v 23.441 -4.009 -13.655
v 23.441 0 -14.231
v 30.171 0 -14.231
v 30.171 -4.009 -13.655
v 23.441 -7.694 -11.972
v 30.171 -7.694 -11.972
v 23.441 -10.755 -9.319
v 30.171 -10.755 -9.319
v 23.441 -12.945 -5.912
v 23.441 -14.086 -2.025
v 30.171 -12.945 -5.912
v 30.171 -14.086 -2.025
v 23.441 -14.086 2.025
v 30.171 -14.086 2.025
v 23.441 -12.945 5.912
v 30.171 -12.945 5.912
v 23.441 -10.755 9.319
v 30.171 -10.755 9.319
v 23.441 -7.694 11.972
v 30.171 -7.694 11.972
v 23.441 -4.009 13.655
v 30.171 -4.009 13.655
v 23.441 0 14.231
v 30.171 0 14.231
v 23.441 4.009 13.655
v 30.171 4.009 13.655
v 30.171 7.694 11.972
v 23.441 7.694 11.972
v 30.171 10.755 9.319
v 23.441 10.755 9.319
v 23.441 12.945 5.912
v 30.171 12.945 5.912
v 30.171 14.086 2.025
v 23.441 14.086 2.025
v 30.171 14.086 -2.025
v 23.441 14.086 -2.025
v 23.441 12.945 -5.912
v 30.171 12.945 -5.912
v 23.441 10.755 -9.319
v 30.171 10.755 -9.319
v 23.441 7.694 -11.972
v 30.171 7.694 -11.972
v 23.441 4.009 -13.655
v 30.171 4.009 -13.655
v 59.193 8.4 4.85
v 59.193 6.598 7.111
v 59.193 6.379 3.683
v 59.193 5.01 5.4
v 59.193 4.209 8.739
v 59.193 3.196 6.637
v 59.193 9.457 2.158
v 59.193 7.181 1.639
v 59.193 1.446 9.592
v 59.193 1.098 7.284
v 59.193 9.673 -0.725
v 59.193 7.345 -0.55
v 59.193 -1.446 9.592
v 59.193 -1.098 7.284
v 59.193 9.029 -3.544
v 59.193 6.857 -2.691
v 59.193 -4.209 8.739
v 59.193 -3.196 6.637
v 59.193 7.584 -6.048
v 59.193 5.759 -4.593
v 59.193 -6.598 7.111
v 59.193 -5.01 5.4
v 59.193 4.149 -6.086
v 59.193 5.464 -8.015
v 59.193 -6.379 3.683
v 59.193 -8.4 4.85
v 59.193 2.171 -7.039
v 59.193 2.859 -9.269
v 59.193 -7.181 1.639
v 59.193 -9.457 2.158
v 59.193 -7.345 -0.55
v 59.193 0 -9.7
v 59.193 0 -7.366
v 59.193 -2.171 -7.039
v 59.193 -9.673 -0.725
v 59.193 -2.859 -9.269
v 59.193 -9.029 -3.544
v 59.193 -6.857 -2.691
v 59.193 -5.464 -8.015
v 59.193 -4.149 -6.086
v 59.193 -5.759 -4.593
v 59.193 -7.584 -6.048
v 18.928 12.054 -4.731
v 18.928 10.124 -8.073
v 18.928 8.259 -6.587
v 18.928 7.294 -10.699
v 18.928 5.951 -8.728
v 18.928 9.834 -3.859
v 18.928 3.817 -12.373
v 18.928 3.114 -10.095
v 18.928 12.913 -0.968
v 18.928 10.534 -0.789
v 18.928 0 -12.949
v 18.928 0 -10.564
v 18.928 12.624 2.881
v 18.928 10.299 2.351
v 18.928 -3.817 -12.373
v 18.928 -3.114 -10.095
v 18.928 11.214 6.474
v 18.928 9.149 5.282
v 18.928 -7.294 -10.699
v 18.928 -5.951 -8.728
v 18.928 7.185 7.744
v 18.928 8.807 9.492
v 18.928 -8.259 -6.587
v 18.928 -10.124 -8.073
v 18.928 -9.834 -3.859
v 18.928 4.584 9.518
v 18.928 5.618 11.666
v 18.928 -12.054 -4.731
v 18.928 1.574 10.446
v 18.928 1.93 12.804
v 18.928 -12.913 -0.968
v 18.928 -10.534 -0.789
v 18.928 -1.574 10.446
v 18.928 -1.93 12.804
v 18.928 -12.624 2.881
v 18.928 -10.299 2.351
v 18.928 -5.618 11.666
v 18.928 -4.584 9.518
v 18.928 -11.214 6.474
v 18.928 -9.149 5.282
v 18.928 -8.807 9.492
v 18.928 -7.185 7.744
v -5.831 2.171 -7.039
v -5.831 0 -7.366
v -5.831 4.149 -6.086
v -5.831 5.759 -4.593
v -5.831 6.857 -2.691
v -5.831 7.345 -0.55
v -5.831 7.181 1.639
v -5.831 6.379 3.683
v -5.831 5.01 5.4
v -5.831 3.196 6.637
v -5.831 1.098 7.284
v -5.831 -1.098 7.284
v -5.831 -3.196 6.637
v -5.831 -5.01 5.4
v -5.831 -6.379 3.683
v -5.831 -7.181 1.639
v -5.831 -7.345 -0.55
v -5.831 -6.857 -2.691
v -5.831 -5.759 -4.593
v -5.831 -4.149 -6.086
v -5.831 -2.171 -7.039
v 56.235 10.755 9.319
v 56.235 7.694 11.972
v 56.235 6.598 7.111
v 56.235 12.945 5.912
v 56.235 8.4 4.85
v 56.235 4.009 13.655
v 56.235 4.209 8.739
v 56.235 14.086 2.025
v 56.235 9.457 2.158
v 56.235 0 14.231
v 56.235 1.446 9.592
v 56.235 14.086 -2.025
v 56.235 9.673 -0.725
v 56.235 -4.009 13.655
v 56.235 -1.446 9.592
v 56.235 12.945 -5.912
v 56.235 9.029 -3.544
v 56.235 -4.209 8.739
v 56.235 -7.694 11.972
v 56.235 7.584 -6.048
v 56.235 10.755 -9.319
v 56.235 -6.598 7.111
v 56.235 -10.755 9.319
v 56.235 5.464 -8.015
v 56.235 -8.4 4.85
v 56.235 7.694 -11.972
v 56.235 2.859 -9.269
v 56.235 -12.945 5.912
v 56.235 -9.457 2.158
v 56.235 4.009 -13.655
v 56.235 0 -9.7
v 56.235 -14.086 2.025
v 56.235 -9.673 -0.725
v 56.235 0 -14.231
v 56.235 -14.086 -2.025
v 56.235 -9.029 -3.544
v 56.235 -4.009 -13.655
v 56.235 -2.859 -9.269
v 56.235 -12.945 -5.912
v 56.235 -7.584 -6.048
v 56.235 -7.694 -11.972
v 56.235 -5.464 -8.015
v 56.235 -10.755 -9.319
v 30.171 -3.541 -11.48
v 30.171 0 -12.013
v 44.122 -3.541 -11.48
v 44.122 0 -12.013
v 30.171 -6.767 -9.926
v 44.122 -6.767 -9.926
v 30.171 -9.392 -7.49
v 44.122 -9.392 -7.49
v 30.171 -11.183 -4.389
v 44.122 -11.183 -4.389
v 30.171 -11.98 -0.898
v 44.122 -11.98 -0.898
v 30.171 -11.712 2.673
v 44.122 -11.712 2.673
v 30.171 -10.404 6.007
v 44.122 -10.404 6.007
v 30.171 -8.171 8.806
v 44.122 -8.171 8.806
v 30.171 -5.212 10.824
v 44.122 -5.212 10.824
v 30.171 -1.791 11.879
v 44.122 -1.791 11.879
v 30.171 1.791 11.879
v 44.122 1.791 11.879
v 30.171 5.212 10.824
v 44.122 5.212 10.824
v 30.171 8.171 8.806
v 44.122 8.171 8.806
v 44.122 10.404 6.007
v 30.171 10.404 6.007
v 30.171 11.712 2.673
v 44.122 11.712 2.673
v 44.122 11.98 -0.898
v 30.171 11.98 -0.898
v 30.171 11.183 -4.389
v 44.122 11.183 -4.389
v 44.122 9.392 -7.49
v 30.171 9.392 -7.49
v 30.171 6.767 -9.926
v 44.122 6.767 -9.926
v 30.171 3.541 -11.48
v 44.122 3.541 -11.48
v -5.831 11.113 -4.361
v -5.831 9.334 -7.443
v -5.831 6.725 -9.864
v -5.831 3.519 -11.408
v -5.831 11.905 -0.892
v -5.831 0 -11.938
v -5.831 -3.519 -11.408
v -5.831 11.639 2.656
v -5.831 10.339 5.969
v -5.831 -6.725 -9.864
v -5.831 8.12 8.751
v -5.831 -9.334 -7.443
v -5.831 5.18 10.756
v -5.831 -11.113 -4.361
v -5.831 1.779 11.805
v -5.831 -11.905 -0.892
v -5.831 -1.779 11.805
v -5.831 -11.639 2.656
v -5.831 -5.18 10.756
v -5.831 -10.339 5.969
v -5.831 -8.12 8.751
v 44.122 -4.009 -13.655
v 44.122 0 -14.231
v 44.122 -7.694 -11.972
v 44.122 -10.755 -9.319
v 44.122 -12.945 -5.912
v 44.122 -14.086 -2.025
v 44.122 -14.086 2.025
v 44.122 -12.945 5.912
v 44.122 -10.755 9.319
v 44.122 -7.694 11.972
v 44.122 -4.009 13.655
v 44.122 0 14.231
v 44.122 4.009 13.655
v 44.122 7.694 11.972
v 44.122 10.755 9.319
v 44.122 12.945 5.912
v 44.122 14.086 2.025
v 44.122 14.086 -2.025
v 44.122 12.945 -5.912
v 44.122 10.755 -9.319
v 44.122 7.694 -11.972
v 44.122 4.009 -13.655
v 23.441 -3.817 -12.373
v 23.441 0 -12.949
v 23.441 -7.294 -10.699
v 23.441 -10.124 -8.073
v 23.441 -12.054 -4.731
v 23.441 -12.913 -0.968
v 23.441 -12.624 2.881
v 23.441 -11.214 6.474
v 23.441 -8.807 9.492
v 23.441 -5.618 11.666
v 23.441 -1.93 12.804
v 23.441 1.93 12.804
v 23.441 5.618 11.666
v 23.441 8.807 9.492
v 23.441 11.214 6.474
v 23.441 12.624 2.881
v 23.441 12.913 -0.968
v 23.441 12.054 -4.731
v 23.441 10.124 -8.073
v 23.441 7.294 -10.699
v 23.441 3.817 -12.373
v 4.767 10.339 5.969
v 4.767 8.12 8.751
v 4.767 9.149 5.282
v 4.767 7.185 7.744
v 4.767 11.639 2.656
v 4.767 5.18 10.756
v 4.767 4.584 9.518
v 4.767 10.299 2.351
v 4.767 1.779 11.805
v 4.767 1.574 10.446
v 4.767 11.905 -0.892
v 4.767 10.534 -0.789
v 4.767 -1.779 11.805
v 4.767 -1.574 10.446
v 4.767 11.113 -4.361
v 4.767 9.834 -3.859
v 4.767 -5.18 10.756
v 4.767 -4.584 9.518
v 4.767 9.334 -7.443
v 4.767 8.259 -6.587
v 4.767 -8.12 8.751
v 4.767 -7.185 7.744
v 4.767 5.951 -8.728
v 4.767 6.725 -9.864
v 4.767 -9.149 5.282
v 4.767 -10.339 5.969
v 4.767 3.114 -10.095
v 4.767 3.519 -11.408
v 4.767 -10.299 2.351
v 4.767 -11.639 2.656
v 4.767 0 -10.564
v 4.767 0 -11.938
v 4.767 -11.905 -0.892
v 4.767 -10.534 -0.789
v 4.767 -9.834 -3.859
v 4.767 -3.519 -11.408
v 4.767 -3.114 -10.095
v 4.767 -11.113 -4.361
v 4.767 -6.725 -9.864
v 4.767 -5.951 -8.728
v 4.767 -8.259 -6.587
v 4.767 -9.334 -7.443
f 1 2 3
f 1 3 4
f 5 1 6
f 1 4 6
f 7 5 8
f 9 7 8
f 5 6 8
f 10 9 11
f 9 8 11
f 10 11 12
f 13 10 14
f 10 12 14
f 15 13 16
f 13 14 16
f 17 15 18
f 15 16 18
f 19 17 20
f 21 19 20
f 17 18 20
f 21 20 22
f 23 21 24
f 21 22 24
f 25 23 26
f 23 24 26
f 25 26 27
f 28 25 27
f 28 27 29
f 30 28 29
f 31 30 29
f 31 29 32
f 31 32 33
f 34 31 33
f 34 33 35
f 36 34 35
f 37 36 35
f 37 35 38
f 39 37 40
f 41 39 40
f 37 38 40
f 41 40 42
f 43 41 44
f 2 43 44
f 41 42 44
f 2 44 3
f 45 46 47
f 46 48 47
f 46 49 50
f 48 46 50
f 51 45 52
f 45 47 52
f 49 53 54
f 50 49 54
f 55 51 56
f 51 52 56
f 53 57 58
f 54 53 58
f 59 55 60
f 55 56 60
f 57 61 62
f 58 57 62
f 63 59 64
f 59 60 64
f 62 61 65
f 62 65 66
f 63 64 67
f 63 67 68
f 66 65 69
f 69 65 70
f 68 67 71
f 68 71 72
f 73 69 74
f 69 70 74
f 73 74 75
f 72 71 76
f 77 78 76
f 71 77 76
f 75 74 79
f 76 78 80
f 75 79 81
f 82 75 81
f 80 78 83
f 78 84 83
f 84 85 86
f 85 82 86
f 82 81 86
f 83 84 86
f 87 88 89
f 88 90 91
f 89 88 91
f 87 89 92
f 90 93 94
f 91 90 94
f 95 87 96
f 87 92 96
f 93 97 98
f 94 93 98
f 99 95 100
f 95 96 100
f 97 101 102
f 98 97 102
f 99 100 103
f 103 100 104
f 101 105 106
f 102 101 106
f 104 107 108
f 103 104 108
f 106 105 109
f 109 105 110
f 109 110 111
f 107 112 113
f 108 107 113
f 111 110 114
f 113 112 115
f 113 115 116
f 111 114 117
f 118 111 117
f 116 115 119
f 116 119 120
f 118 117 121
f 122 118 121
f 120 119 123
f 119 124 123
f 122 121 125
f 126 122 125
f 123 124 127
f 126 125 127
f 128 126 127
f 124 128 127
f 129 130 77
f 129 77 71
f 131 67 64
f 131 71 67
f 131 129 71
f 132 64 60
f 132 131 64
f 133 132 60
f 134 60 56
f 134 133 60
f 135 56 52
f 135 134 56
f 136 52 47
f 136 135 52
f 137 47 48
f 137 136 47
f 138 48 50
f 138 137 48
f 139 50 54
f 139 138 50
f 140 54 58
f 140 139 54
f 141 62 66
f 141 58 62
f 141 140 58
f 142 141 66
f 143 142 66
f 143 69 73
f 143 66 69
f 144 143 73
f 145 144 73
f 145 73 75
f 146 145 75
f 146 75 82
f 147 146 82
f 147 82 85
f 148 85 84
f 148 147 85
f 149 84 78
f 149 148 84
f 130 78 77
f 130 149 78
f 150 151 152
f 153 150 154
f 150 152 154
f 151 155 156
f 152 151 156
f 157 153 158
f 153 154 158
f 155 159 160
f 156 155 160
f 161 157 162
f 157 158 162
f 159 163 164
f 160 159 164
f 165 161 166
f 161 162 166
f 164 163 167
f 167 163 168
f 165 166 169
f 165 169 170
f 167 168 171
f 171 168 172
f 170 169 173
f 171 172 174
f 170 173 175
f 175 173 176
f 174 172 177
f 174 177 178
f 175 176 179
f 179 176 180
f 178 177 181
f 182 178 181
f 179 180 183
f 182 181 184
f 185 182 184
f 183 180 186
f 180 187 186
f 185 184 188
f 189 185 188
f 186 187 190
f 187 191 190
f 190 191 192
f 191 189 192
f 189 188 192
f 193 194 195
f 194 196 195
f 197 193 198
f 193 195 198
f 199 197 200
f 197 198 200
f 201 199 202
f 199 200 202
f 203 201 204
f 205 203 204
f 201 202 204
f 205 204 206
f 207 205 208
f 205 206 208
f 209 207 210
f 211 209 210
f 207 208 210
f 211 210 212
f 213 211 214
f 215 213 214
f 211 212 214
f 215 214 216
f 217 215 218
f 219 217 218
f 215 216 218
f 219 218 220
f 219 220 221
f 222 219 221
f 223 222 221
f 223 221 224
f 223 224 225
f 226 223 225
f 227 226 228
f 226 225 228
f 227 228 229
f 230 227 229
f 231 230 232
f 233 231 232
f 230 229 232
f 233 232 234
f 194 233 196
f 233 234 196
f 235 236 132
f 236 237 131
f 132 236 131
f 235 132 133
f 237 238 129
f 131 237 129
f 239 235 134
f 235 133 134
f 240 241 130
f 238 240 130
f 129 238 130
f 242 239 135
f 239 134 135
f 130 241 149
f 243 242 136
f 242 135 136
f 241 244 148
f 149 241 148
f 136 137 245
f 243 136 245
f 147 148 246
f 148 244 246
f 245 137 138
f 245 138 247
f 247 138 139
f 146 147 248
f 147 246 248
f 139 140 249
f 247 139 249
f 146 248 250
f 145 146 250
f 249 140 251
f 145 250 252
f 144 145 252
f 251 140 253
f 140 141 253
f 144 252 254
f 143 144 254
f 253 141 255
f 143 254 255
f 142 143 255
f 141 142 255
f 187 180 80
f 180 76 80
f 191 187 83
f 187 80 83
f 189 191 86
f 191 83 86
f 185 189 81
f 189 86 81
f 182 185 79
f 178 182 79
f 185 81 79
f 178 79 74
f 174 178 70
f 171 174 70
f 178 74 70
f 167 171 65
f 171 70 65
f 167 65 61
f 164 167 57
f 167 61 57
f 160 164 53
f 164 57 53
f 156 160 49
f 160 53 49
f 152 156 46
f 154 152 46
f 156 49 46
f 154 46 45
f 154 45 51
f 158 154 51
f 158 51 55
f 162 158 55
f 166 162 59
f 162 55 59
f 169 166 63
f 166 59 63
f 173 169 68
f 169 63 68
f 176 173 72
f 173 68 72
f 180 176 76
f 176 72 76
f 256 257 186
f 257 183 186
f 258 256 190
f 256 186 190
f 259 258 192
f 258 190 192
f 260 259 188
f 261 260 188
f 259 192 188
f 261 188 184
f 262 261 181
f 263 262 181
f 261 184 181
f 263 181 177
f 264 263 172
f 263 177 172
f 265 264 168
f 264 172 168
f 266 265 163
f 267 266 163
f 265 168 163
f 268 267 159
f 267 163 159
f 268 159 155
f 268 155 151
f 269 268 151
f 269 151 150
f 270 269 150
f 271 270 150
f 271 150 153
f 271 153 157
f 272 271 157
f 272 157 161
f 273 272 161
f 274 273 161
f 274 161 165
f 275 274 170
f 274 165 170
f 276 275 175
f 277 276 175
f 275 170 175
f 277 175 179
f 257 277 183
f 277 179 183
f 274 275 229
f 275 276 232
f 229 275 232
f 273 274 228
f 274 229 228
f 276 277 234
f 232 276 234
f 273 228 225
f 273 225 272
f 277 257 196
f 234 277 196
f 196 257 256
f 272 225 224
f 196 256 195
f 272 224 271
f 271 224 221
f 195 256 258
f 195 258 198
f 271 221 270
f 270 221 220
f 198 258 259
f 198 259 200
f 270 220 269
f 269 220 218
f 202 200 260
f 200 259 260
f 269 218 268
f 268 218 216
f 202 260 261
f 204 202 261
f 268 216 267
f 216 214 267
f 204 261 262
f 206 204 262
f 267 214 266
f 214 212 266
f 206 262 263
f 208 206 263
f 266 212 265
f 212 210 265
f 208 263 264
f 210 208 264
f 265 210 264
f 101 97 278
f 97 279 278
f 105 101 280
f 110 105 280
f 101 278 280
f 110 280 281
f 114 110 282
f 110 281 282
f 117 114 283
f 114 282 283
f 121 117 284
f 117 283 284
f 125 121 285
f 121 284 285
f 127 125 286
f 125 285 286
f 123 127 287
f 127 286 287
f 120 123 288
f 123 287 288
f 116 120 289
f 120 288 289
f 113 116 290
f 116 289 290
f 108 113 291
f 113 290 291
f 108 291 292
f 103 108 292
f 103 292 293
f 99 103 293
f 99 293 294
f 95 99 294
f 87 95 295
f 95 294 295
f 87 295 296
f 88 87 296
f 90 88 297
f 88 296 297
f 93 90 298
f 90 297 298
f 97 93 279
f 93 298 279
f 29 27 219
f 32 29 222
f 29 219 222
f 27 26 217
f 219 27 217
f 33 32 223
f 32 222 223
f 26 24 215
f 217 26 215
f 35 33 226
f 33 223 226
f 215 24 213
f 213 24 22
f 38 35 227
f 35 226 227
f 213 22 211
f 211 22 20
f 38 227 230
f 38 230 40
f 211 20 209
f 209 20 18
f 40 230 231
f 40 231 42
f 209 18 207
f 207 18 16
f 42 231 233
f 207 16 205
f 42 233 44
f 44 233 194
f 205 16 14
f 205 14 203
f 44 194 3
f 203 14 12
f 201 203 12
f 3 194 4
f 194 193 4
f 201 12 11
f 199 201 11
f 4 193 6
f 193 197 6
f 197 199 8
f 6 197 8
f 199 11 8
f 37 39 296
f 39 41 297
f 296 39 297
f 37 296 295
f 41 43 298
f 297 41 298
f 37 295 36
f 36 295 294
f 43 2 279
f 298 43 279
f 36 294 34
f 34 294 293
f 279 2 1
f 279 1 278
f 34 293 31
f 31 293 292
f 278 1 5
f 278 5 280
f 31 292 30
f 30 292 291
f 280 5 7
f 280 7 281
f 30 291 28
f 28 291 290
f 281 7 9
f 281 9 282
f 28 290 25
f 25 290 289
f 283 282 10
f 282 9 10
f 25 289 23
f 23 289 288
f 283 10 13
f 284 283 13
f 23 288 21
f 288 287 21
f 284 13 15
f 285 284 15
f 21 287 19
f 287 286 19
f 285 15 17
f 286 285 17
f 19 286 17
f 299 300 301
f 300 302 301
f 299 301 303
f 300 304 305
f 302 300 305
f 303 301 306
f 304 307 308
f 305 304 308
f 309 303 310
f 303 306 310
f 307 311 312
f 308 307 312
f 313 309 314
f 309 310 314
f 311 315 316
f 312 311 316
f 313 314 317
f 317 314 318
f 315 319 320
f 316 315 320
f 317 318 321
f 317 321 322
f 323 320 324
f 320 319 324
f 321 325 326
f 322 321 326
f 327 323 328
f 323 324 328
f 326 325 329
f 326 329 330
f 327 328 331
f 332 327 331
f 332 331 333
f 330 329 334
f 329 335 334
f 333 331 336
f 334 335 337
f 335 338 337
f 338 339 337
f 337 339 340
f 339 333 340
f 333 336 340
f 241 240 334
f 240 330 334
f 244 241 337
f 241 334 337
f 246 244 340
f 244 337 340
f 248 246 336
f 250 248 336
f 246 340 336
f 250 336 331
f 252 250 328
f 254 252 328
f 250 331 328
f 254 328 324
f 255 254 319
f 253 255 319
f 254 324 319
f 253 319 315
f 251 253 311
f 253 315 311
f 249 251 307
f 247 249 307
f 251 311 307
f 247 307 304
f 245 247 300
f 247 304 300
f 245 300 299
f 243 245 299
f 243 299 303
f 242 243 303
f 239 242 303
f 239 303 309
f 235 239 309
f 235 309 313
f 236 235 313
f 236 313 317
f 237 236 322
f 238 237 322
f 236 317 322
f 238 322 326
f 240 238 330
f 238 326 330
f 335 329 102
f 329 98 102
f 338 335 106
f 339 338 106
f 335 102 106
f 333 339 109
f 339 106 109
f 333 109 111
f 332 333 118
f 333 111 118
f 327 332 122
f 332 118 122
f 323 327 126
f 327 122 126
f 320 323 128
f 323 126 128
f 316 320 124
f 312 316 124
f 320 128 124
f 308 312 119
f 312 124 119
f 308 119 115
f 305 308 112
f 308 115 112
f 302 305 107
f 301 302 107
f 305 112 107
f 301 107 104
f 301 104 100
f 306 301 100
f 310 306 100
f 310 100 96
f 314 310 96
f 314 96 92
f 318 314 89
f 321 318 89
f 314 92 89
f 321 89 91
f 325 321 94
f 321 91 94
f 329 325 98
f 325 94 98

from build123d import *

# Parameters (mm, degrees)
CUT_EXTRUDE1_DEPTH      = 69.067346778
CUT_EXTRUDE1_DEPTH_BACK = 69.067346778
SKETCH3_R               = 7.366


with BuildPart() as part:
    # Sketch2 → Revolve1 (revolve)
    with BuildSketch(Plane(origin=(0, 0, 0), x_dir=(1, 0, 0), z_dir=(0, 1, 0))):
        Polygon((-5.831340186, 11.938), (4.767118223, 11.938), (4.767118223, 10.563948577), (18.927664498, 10.563948577), (18.927664498, 12.948727397), (23.441288756, 12.948727397), (23.441288756, 14.231007016), (30.170692197, 14.231007016), (30.170692197, 12.013405261), (44.121894451, 12.013405261), (44.121894451, 14.231007016), (56.23516923, 14.231007016), (56.23516923, 9.700025704), (59.192659814, 9.700025704), (59.192659814, 0), (-5.831340186, 0), align=None)
    revolve(axis=Axis((59.192659814, 0, 0), (-1, 0, 0)))

    # Sketch3 → Cut-Extrude1 (cut, two sides: drawn at the far end of the back side and taken through both)
    with BuildSketch(Plane(origin=(59.192659814, 0, 0), x_dir=(0, 0, -1), z_dir=(1, 0, 0)).offset(-CUT_EXTRUDE1_DEPTH_BACK)):
        Circle(SKETCH3_R)
    extrude(amount=CUT_EXTRUDE1_DEPTH + CUT_EXTRUDE1_DEPTH_BACK, mode=Mode.SUBTRACT)


solid = part.part
